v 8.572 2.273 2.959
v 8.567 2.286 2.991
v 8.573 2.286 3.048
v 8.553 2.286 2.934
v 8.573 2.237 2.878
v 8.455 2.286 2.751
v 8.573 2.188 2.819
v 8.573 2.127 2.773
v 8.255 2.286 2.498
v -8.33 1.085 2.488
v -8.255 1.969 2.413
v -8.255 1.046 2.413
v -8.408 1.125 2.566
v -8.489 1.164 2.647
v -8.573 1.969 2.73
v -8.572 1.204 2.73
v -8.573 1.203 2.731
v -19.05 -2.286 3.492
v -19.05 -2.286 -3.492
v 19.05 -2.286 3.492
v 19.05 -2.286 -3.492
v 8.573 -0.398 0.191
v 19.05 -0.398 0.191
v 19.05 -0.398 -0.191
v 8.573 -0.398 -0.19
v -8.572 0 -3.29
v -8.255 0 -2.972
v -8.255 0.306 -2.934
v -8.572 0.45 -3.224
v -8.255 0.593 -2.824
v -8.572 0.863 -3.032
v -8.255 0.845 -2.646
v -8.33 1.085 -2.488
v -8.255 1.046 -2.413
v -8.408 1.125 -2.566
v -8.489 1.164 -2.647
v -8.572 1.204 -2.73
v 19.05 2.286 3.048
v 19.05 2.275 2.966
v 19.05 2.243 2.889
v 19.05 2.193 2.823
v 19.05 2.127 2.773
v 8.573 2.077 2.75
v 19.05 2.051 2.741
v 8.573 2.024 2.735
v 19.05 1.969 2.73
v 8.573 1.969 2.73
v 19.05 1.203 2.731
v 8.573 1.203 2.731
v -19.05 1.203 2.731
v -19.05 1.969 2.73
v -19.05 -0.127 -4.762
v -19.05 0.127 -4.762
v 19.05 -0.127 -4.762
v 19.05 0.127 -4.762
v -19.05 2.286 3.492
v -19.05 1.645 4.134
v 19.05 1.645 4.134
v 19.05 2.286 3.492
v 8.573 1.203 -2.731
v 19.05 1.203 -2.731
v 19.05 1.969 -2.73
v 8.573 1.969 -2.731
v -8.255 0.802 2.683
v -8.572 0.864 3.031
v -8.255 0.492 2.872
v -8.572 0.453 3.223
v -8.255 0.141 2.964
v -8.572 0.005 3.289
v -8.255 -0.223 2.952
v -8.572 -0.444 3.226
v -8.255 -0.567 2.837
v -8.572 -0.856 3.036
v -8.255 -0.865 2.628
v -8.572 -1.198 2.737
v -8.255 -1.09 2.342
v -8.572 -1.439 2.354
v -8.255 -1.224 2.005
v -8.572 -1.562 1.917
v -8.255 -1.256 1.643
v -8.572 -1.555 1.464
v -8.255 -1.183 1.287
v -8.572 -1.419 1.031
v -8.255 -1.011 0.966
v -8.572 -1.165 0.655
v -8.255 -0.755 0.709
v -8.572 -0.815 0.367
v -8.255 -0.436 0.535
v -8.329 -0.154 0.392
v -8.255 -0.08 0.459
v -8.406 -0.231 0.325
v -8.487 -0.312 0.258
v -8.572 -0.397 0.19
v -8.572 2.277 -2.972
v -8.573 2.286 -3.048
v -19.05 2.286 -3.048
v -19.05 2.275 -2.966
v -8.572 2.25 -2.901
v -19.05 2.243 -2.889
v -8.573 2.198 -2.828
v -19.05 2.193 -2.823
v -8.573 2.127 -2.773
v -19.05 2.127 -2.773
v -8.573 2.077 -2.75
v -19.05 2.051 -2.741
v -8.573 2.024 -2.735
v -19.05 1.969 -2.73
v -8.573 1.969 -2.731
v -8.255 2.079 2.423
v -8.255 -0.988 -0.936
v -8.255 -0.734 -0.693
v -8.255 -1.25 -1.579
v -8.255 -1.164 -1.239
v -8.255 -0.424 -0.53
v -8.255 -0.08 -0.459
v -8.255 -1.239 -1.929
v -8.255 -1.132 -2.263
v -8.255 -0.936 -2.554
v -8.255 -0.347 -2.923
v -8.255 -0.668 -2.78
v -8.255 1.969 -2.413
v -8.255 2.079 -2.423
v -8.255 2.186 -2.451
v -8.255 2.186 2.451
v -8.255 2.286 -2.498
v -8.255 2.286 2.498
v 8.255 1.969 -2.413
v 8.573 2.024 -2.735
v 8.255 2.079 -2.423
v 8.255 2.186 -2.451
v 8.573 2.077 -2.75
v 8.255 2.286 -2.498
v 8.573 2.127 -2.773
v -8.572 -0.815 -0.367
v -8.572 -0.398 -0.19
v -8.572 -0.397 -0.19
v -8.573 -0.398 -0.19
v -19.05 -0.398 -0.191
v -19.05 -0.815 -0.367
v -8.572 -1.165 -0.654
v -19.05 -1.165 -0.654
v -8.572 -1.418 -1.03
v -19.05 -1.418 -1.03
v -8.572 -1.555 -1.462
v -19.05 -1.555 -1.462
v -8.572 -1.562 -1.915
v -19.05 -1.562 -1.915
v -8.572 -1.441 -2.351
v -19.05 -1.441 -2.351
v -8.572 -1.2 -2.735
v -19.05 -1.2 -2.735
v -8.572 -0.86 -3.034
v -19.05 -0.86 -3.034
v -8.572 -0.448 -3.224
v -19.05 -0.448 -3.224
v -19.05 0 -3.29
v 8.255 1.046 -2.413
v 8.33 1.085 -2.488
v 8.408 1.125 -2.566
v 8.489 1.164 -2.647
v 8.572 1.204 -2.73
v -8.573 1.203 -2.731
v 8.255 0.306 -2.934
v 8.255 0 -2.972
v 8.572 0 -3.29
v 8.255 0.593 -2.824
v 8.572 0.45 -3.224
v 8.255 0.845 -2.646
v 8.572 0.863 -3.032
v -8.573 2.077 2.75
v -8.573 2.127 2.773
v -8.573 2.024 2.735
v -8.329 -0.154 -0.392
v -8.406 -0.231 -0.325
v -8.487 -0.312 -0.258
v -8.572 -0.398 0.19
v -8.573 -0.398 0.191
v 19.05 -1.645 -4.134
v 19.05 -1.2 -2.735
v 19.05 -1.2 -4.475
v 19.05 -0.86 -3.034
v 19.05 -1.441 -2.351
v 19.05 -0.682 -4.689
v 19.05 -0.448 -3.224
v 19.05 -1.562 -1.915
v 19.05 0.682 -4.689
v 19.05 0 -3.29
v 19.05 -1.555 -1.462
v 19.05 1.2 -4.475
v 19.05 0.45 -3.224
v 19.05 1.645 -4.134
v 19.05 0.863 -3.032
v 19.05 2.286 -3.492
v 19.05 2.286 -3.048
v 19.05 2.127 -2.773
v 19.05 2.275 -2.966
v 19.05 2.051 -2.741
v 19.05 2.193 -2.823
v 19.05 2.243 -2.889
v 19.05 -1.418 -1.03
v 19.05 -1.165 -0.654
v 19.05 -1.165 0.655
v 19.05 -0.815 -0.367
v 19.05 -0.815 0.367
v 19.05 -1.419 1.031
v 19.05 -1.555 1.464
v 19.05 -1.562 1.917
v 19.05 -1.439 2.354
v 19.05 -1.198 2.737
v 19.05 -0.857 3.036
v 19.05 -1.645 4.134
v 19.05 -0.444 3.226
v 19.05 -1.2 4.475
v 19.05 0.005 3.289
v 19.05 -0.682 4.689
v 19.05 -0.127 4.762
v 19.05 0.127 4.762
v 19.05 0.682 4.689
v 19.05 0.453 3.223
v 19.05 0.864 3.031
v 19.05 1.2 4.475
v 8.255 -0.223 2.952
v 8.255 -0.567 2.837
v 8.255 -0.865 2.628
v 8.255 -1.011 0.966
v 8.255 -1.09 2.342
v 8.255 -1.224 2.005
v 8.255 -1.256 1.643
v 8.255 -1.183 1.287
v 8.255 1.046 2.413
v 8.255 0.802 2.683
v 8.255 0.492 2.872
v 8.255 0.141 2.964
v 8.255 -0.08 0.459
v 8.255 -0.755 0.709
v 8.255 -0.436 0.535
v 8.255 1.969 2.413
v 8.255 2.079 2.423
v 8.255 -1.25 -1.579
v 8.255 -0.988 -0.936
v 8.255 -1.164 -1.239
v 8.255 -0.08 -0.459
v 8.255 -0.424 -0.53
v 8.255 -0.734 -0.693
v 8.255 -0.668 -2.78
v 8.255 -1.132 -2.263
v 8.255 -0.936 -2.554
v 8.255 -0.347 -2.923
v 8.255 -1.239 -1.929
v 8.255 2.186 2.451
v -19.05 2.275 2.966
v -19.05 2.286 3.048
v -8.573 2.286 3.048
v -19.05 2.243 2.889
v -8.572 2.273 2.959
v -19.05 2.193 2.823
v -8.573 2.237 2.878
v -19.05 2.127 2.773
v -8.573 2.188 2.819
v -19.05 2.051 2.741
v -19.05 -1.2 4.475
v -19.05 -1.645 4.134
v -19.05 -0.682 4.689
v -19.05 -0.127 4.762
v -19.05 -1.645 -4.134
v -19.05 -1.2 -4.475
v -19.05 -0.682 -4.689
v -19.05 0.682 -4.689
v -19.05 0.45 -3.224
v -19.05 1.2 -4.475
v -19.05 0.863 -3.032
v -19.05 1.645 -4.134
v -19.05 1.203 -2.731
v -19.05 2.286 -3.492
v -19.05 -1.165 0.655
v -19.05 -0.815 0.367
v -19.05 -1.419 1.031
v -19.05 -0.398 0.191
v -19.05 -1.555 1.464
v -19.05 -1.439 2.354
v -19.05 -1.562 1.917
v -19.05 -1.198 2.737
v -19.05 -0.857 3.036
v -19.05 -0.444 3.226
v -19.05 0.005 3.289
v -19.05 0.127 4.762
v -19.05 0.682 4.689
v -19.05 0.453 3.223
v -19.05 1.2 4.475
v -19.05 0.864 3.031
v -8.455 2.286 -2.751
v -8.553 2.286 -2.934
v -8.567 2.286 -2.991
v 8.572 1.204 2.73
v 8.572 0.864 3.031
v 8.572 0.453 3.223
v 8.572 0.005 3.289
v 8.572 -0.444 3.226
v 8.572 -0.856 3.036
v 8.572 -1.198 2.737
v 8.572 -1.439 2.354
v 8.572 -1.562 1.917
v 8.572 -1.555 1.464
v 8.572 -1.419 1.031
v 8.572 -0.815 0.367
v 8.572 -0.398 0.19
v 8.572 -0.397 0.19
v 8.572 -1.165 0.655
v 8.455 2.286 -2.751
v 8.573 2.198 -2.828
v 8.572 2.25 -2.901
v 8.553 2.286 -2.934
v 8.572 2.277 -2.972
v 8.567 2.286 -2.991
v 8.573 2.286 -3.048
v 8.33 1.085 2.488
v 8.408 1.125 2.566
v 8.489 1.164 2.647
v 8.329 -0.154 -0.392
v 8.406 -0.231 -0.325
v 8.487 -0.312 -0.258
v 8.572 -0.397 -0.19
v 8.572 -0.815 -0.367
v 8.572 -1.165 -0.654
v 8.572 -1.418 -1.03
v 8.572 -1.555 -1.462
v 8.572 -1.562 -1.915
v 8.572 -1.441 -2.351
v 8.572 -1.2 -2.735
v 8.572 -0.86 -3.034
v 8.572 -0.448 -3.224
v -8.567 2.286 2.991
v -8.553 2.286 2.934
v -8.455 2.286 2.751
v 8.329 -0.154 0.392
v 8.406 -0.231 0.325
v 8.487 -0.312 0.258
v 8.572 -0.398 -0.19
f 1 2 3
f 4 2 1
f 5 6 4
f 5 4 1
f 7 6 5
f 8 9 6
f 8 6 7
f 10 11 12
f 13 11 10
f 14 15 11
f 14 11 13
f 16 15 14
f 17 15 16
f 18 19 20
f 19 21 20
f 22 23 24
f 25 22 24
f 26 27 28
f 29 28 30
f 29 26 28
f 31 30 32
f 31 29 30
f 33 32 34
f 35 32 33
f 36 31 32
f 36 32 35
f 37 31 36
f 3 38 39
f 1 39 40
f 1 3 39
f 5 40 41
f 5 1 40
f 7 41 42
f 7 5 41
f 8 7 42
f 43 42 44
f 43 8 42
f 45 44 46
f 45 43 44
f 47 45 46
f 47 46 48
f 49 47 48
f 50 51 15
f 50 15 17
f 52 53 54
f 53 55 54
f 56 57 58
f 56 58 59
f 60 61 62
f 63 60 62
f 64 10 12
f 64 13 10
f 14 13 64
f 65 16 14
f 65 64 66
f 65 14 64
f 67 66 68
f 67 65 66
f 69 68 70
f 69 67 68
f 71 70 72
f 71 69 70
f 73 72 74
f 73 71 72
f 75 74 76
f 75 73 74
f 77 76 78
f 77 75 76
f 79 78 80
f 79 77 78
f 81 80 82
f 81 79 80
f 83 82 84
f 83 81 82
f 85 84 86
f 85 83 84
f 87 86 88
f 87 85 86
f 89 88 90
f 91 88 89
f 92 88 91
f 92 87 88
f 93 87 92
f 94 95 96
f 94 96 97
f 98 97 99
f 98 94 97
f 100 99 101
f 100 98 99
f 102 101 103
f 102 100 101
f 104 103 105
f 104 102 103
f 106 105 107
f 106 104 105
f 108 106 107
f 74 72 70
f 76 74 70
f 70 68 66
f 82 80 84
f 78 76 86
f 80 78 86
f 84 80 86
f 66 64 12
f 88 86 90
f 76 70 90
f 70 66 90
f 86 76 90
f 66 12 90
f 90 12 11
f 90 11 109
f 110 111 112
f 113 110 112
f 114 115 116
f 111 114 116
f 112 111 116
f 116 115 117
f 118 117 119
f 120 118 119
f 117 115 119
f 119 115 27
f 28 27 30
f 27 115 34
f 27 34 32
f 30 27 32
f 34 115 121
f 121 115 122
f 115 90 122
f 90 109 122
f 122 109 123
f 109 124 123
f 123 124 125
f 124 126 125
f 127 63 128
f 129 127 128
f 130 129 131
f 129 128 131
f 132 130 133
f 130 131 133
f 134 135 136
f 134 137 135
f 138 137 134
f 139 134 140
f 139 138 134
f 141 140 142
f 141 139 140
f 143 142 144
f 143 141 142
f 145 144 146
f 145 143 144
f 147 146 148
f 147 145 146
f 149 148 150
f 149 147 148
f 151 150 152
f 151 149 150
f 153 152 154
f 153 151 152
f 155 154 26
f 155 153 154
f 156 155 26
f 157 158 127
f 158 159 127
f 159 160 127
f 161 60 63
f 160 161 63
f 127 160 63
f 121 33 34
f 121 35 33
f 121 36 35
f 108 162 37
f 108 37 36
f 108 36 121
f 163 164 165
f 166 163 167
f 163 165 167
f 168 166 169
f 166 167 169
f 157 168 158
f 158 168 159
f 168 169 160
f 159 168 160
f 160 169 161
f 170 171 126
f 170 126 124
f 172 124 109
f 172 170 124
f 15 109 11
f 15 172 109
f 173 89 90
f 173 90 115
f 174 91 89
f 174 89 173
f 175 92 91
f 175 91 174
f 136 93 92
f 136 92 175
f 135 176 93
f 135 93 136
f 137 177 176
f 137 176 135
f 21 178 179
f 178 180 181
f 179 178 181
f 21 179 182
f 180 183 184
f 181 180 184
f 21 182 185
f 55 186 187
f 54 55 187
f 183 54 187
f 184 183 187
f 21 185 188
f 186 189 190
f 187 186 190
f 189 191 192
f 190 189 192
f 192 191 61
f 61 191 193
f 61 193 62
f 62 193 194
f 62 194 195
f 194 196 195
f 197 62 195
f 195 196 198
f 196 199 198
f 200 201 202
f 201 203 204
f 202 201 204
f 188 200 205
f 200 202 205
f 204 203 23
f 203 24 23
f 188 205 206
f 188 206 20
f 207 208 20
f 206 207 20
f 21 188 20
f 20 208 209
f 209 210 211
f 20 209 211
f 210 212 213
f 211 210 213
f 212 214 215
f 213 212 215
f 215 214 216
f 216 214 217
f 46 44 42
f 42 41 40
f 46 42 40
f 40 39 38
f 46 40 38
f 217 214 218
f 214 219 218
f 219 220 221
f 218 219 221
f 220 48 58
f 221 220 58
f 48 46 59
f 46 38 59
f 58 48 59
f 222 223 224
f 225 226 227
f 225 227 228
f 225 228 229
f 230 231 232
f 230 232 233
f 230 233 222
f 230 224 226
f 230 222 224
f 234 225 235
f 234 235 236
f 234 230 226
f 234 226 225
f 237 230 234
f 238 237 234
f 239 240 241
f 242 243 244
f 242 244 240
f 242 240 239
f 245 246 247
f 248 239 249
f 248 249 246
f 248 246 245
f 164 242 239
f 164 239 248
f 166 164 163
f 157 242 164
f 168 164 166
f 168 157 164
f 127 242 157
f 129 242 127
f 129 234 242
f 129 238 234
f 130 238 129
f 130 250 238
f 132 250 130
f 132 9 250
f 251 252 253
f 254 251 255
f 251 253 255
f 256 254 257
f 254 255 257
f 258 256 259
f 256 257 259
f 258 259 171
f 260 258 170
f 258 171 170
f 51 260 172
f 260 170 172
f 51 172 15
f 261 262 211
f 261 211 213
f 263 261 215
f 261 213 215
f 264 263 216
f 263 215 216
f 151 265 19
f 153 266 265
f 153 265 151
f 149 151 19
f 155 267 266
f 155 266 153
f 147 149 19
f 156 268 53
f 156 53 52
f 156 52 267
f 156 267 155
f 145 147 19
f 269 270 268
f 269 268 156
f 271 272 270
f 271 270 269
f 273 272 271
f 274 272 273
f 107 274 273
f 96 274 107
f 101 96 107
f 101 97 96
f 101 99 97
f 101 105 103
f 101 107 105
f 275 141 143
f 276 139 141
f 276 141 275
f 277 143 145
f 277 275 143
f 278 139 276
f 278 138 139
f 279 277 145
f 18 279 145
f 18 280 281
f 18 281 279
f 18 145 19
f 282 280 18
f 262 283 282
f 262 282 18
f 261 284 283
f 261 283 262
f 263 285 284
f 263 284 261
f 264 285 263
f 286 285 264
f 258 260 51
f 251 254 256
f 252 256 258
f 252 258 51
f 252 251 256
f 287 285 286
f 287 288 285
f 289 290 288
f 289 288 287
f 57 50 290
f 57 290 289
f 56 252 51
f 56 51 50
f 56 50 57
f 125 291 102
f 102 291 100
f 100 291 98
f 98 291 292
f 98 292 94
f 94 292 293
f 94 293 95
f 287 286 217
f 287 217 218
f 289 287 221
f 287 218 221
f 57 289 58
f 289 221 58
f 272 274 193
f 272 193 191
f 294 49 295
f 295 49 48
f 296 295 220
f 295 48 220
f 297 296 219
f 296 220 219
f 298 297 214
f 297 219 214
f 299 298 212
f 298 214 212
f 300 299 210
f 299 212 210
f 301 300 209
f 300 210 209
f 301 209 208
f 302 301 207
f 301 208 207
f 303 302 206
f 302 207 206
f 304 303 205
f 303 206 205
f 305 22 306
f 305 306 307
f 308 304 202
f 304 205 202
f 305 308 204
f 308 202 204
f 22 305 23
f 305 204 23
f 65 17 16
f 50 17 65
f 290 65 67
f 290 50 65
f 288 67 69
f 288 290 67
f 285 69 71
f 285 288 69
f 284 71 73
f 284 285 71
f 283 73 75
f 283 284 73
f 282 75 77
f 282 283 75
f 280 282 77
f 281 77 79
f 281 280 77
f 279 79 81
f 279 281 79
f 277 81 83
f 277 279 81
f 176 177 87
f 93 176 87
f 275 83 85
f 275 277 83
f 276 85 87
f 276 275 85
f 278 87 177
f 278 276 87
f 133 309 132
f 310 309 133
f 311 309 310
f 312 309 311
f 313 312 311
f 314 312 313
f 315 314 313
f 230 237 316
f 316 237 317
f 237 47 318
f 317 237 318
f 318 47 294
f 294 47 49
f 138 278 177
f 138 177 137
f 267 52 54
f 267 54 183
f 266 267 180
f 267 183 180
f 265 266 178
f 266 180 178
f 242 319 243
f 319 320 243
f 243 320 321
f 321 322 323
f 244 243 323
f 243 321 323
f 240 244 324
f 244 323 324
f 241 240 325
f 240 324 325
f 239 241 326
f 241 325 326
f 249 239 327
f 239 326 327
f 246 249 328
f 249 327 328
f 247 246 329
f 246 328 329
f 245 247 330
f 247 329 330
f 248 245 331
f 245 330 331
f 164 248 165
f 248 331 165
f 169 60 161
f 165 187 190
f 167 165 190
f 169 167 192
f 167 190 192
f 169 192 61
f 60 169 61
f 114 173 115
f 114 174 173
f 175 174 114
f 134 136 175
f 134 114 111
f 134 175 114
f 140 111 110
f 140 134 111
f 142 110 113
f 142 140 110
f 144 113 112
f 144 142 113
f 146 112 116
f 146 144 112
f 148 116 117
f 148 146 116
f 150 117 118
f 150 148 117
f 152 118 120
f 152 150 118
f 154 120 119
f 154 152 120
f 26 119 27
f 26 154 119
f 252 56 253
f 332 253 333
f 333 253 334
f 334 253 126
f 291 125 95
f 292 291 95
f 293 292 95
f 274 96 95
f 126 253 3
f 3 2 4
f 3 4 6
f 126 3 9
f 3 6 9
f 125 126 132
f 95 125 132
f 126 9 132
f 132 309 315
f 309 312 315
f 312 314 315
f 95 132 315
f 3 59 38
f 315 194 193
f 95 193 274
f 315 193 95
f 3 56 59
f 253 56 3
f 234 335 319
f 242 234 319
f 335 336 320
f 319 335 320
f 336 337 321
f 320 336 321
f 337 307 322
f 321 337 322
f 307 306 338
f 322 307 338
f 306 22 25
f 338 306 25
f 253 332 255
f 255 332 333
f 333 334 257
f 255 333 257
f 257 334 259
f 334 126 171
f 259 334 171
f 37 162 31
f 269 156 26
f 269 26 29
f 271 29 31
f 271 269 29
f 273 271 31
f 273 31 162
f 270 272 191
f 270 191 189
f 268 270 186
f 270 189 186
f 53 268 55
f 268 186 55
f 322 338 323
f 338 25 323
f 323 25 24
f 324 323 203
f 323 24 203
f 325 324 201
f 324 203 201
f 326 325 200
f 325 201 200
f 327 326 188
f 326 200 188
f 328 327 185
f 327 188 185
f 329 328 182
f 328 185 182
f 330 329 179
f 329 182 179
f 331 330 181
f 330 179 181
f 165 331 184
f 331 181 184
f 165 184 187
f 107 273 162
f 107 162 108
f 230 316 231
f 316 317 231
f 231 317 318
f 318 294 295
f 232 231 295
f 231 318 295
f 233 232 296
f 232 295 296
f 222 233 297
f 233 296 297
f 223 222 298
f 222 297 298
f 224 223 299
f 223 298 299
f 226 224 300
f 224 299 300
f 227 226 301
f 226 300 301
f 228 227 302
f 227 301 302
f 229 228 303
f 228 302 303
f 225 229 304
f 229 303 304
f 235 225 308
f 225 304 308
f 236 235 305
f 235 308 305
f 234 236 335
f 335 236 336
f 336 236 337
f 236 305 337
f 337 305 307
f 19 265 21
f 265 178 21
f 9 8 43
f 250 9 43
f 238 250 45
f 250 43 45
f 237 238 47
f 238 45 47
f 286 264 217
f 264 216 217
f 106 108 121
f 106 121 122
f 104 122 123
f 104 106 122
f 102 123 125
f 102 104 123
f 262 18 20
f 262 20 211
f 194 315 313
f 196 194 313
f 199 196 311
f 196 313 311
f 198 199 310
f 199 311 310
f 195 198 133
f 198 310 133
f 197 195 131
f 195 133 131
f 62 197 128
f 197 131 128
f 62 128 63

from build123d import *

# Parameters (mm, degrees)
BOSS_EXTRUDE1_DEPTH = 19.05
CUT_EXTRUDE1_DEPTH  = 10.795
FILLET1_R           = 0.3175
CHAMFER1_SIZE       = 0.3175


with BuildPart() as part:
    # Sketch1 → Boss-Extrude1 (new body)
    with BuildSketch(Plane(origin=(0, 0, 0), x_dir=(0, 0, -1), z_dir=(1, 0, 0))):
        with BuildLine():
            Line((3.4925, -2.286), (-3.4925, -2.286))
            Line((-3.4925, -2.286), (-4.133882072, -1.644617928))
            ThreePointArc((-4.133882072, -1.644617928), (-4.599127523, -0.948328904), (-4.7625, -0.127))
            Line((-4.7625, -0.127), (-4.7625, 0.127))
            ThreePointArc((-4.7625, 0.127), (-4.599127523, 0.948328904), (-4.133882072, 1.644617928))
            Line((-4.133882072, 1.644617928), (-3.4925, 2.286))
            Line((-3.4925, 2.286), (3.4925, 2.286))
            Line((3.4925, 2.286), (4.133882072, 1.644617928))
            ThreePointArc((4.133882072, 1.644617928), (4.599127523, 0.948328904), (4.7625, 0.127))
            Line((4.7625, 0.127), (4.7625, -0.127))
            ThreePointArc((4.7625, -0.127), (4.599127523, -0.948328904), (4.133882072, -1.644617928))
            Line((4.133882072, -1.644617928), (3.4925, -2.286))
        make_face()
    extrude(amount=BOSS_EXTRUDE1_DEPTH)

    # Sketch2 → Cut-Extrude1 (cut)
    with BuildSketch(Plane(origin=(19.05, 0, 0), x_dir=(0, 0, -1), z_dir=(1, 0, 0))):
        with BuildLine():
            ThreePointArc((-0.139499975, 0), (-1.051014863, 1.428430101), (-2.7305, 1.203482064))
            Line((-2.7305, 1.203482064), (-0.1905, -0.397553869))
            ThreePointArc((-0.1905, -0.397553869), (-0.15230201, -0.200405889), (-0.139499975, 0))
        make_face()
        with BuildLine():
            Line((-0.1905, -0.397553869), (-2.7305, 1.203482064))
            ThreePointArc((-2.7305, 1.203482064), (-2.554348209, -1.332396361), (-0.1905, -0.397553869))
        make_face()
        with BuildLine():
            Line((-2.7305, 2.286), (-2.7305, 1.203482064))
            ThreePointArc((-2.7305, 1.203482064), (-1.051014863, 1.428430101), (-0.139499975, 0))
            ThreePointArc((-0.139499975, 0), (-0.15230201, -0.200405889), (-0.1905, -0.397553869))
            Line((-0.1905, -0.397553869), (0.1905, -0.397553869))
            ThreePointArc((0.1905, -0.397553869), (0.874651791, 1.332396361), (2.7305, 1.203482064))
            Line((2.7305, 1.203482064), (2.7305, 2.286))
            Line((2.7305, 2.286), (-2.7305, 2.286))
        make_face()
        with BuildLine():
            ThreePointArc((2.7305, 1.203482064), (0.874651791, 1.332396361), (0.1905, -0.397553869))
            Line((0.1905, -0.397553869), (2.7305, 1.203482064))
        make_face()
        with BuildLine():
            Line((2.7305, 1.203482064), (0.1905, -0.397553869))
            ThreePointArc((0.1905, -0.397553869), (1.914905889, -1.56219799), (3.289500025, 0))
            ThreePointArc((3.289500025, 0), (3.142930101, 0.663485137), (2.7305, 1.203482064))
        make_face()
    extrude(amount=-CUT_EXTRUDE1_DEPTH, mode=Mode.SUBTRACT)

    # Fillet1
    fillet1_edges = [part.edges().sort_by_distance(p)[0] for p in [
        (13.6525, 2.286, 2.7305),
        (13.6525, 2.286, -2.7305),
    ]]
    fillet(fillet1_edges, radius=FILLET1_R)

    # Chamfer1
    chamfer1_edges = [part.edges().sort_by_distance(p)[0] for p in [
        (8.255, -0.397553869, 0),
    ]]
    chamfer(chamfer1_edges, length=CHAMFER1_SIZE)
    chamfer1_2_edges = [part.edges().sort_by_distance(p)[0] for p in [
        (8.255, 2.193006403, 2.823493597),
        (8.255, 1.585991032, 2.7305),
    ]]
    chamfer(chamfer1_2_edges, length=CHAMFER1_SIZE)
    chamfer1_3_edges = [part.edges().sort_by_distance(p)[0] for p in [
        (8.255, 1.585991032, -2.7305),
        (8.255, 2.193006403, -2.823493597),
    ]]
    chamfer(chamfer1_3_edges, length=CHAMFER1_SIZE)
    chamfer1_4_edges = [part.edges().sort_by_distance(p)[0] for p in [
        (8.255, -1.332396361, -2.554348209),
    ]]
    chamfer(chamfer1_4_edges, length=CHAMFER1_SIZE - 0.0001)  # a hair under: the kernel refuses the full size
    chamfer1_5_edges = [part.edges().sort_by_distance(p)[0] for p in [
        (8.255, -1.332396361, 2.554348209),
    ]]
    chamfer(chamfer1_5_edges, length=CHAMFER1_SIZE - 0.0001)  # a hair under: the kernel refuses the full size

    # Mirror1: part across plane


with BuildPart() as part_1:
    add(part.part)
    add(part.part.mirror(Plane(origin=(0, 0, 0), x_dir=(0, 0, 1), z_dir=(1, 0, 0))))


solid = part_1.part
